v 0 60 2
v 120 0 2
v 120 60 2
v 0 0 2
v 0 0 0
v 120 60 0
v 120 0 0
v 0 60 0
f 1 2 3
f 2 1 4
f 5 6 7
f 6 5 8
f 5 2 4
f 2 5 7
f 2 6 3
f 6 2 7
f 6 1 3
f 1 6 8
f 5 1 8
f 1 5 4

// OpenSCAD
// box design for midi-2-dmx controller


$fn=50;


h_box=50;
w_box=120;
d_box=60;
d_midi=15;
h_midi=10;
d_dmx=23.4;
h_dmx=10;
t1_box=2;
t2_box=5;



//box();

cover();


module box() {
	union() {

		translate([10, 0, 0]) cube([15, 60, 10]);
		translate([60, 0, 0]) cube([15, 60, 10]);

		translate([t1_box-0.1, t1_box-0.1, h_box]) screwFoo();
		translate([t1_box-0.1, d_box-t1_box+0.1, h_box]) rotate(a=[0, 0, -90]) screwFoo();
		translate([w_box-t1_box+0.1, t1_box-0.1, h_box]) rotate(a=[0, 0, 90]) screwFoo();
		translate([w_box-t1_box+0.1, d_box-t1_box+0.1, h_box]) rotate(a=[0, 0, 180]) screwFoo();

		difference() {
			// outer cube
			cube([w_box, d_box, h_box]);

			// inner cube
			translate([t1_box, t1_box, t1_box]) cube([w_box-t1_box-t2_box, d_box-2*t1_box, h_box]);

			// power connector hole
			translate([0, 3.5+t1_box, 14]) cube([20, 10, 9]);

			// usb connector hole
			translate([0, 35+t1_box, 14]) cube([20, 13, 9]);

			// dmx connector hole
			translate([100, d_dmx/2+7, d_dmx/2+h_dmx]) rotate(a=[0, 90, 0]) cylinder(h=40, r=d_dmx/2); 

			// midi connector hole
			translate([100, d_midi/2+38, d_midi/2+h_dmx]) rotate(a=[0, 90, 0]) cylinder(h=40, r=d_midi/2); 
		}
	}
}


module cover() {
	cube([w_box, d_box, t1_box]);
}


module screwFoo() {
	difference() {
		translate([0, 0, -8]) {
			union() {
				cylinder(h=8, r=6);
				translate([0, 0, -5]) cylinder(h=5, r1=0.1, r2=6);
			}
		}
		translate([-20, -10, -20]) cube(20);
		translate([-10, -20, -20]) cube(20);
	}
}
